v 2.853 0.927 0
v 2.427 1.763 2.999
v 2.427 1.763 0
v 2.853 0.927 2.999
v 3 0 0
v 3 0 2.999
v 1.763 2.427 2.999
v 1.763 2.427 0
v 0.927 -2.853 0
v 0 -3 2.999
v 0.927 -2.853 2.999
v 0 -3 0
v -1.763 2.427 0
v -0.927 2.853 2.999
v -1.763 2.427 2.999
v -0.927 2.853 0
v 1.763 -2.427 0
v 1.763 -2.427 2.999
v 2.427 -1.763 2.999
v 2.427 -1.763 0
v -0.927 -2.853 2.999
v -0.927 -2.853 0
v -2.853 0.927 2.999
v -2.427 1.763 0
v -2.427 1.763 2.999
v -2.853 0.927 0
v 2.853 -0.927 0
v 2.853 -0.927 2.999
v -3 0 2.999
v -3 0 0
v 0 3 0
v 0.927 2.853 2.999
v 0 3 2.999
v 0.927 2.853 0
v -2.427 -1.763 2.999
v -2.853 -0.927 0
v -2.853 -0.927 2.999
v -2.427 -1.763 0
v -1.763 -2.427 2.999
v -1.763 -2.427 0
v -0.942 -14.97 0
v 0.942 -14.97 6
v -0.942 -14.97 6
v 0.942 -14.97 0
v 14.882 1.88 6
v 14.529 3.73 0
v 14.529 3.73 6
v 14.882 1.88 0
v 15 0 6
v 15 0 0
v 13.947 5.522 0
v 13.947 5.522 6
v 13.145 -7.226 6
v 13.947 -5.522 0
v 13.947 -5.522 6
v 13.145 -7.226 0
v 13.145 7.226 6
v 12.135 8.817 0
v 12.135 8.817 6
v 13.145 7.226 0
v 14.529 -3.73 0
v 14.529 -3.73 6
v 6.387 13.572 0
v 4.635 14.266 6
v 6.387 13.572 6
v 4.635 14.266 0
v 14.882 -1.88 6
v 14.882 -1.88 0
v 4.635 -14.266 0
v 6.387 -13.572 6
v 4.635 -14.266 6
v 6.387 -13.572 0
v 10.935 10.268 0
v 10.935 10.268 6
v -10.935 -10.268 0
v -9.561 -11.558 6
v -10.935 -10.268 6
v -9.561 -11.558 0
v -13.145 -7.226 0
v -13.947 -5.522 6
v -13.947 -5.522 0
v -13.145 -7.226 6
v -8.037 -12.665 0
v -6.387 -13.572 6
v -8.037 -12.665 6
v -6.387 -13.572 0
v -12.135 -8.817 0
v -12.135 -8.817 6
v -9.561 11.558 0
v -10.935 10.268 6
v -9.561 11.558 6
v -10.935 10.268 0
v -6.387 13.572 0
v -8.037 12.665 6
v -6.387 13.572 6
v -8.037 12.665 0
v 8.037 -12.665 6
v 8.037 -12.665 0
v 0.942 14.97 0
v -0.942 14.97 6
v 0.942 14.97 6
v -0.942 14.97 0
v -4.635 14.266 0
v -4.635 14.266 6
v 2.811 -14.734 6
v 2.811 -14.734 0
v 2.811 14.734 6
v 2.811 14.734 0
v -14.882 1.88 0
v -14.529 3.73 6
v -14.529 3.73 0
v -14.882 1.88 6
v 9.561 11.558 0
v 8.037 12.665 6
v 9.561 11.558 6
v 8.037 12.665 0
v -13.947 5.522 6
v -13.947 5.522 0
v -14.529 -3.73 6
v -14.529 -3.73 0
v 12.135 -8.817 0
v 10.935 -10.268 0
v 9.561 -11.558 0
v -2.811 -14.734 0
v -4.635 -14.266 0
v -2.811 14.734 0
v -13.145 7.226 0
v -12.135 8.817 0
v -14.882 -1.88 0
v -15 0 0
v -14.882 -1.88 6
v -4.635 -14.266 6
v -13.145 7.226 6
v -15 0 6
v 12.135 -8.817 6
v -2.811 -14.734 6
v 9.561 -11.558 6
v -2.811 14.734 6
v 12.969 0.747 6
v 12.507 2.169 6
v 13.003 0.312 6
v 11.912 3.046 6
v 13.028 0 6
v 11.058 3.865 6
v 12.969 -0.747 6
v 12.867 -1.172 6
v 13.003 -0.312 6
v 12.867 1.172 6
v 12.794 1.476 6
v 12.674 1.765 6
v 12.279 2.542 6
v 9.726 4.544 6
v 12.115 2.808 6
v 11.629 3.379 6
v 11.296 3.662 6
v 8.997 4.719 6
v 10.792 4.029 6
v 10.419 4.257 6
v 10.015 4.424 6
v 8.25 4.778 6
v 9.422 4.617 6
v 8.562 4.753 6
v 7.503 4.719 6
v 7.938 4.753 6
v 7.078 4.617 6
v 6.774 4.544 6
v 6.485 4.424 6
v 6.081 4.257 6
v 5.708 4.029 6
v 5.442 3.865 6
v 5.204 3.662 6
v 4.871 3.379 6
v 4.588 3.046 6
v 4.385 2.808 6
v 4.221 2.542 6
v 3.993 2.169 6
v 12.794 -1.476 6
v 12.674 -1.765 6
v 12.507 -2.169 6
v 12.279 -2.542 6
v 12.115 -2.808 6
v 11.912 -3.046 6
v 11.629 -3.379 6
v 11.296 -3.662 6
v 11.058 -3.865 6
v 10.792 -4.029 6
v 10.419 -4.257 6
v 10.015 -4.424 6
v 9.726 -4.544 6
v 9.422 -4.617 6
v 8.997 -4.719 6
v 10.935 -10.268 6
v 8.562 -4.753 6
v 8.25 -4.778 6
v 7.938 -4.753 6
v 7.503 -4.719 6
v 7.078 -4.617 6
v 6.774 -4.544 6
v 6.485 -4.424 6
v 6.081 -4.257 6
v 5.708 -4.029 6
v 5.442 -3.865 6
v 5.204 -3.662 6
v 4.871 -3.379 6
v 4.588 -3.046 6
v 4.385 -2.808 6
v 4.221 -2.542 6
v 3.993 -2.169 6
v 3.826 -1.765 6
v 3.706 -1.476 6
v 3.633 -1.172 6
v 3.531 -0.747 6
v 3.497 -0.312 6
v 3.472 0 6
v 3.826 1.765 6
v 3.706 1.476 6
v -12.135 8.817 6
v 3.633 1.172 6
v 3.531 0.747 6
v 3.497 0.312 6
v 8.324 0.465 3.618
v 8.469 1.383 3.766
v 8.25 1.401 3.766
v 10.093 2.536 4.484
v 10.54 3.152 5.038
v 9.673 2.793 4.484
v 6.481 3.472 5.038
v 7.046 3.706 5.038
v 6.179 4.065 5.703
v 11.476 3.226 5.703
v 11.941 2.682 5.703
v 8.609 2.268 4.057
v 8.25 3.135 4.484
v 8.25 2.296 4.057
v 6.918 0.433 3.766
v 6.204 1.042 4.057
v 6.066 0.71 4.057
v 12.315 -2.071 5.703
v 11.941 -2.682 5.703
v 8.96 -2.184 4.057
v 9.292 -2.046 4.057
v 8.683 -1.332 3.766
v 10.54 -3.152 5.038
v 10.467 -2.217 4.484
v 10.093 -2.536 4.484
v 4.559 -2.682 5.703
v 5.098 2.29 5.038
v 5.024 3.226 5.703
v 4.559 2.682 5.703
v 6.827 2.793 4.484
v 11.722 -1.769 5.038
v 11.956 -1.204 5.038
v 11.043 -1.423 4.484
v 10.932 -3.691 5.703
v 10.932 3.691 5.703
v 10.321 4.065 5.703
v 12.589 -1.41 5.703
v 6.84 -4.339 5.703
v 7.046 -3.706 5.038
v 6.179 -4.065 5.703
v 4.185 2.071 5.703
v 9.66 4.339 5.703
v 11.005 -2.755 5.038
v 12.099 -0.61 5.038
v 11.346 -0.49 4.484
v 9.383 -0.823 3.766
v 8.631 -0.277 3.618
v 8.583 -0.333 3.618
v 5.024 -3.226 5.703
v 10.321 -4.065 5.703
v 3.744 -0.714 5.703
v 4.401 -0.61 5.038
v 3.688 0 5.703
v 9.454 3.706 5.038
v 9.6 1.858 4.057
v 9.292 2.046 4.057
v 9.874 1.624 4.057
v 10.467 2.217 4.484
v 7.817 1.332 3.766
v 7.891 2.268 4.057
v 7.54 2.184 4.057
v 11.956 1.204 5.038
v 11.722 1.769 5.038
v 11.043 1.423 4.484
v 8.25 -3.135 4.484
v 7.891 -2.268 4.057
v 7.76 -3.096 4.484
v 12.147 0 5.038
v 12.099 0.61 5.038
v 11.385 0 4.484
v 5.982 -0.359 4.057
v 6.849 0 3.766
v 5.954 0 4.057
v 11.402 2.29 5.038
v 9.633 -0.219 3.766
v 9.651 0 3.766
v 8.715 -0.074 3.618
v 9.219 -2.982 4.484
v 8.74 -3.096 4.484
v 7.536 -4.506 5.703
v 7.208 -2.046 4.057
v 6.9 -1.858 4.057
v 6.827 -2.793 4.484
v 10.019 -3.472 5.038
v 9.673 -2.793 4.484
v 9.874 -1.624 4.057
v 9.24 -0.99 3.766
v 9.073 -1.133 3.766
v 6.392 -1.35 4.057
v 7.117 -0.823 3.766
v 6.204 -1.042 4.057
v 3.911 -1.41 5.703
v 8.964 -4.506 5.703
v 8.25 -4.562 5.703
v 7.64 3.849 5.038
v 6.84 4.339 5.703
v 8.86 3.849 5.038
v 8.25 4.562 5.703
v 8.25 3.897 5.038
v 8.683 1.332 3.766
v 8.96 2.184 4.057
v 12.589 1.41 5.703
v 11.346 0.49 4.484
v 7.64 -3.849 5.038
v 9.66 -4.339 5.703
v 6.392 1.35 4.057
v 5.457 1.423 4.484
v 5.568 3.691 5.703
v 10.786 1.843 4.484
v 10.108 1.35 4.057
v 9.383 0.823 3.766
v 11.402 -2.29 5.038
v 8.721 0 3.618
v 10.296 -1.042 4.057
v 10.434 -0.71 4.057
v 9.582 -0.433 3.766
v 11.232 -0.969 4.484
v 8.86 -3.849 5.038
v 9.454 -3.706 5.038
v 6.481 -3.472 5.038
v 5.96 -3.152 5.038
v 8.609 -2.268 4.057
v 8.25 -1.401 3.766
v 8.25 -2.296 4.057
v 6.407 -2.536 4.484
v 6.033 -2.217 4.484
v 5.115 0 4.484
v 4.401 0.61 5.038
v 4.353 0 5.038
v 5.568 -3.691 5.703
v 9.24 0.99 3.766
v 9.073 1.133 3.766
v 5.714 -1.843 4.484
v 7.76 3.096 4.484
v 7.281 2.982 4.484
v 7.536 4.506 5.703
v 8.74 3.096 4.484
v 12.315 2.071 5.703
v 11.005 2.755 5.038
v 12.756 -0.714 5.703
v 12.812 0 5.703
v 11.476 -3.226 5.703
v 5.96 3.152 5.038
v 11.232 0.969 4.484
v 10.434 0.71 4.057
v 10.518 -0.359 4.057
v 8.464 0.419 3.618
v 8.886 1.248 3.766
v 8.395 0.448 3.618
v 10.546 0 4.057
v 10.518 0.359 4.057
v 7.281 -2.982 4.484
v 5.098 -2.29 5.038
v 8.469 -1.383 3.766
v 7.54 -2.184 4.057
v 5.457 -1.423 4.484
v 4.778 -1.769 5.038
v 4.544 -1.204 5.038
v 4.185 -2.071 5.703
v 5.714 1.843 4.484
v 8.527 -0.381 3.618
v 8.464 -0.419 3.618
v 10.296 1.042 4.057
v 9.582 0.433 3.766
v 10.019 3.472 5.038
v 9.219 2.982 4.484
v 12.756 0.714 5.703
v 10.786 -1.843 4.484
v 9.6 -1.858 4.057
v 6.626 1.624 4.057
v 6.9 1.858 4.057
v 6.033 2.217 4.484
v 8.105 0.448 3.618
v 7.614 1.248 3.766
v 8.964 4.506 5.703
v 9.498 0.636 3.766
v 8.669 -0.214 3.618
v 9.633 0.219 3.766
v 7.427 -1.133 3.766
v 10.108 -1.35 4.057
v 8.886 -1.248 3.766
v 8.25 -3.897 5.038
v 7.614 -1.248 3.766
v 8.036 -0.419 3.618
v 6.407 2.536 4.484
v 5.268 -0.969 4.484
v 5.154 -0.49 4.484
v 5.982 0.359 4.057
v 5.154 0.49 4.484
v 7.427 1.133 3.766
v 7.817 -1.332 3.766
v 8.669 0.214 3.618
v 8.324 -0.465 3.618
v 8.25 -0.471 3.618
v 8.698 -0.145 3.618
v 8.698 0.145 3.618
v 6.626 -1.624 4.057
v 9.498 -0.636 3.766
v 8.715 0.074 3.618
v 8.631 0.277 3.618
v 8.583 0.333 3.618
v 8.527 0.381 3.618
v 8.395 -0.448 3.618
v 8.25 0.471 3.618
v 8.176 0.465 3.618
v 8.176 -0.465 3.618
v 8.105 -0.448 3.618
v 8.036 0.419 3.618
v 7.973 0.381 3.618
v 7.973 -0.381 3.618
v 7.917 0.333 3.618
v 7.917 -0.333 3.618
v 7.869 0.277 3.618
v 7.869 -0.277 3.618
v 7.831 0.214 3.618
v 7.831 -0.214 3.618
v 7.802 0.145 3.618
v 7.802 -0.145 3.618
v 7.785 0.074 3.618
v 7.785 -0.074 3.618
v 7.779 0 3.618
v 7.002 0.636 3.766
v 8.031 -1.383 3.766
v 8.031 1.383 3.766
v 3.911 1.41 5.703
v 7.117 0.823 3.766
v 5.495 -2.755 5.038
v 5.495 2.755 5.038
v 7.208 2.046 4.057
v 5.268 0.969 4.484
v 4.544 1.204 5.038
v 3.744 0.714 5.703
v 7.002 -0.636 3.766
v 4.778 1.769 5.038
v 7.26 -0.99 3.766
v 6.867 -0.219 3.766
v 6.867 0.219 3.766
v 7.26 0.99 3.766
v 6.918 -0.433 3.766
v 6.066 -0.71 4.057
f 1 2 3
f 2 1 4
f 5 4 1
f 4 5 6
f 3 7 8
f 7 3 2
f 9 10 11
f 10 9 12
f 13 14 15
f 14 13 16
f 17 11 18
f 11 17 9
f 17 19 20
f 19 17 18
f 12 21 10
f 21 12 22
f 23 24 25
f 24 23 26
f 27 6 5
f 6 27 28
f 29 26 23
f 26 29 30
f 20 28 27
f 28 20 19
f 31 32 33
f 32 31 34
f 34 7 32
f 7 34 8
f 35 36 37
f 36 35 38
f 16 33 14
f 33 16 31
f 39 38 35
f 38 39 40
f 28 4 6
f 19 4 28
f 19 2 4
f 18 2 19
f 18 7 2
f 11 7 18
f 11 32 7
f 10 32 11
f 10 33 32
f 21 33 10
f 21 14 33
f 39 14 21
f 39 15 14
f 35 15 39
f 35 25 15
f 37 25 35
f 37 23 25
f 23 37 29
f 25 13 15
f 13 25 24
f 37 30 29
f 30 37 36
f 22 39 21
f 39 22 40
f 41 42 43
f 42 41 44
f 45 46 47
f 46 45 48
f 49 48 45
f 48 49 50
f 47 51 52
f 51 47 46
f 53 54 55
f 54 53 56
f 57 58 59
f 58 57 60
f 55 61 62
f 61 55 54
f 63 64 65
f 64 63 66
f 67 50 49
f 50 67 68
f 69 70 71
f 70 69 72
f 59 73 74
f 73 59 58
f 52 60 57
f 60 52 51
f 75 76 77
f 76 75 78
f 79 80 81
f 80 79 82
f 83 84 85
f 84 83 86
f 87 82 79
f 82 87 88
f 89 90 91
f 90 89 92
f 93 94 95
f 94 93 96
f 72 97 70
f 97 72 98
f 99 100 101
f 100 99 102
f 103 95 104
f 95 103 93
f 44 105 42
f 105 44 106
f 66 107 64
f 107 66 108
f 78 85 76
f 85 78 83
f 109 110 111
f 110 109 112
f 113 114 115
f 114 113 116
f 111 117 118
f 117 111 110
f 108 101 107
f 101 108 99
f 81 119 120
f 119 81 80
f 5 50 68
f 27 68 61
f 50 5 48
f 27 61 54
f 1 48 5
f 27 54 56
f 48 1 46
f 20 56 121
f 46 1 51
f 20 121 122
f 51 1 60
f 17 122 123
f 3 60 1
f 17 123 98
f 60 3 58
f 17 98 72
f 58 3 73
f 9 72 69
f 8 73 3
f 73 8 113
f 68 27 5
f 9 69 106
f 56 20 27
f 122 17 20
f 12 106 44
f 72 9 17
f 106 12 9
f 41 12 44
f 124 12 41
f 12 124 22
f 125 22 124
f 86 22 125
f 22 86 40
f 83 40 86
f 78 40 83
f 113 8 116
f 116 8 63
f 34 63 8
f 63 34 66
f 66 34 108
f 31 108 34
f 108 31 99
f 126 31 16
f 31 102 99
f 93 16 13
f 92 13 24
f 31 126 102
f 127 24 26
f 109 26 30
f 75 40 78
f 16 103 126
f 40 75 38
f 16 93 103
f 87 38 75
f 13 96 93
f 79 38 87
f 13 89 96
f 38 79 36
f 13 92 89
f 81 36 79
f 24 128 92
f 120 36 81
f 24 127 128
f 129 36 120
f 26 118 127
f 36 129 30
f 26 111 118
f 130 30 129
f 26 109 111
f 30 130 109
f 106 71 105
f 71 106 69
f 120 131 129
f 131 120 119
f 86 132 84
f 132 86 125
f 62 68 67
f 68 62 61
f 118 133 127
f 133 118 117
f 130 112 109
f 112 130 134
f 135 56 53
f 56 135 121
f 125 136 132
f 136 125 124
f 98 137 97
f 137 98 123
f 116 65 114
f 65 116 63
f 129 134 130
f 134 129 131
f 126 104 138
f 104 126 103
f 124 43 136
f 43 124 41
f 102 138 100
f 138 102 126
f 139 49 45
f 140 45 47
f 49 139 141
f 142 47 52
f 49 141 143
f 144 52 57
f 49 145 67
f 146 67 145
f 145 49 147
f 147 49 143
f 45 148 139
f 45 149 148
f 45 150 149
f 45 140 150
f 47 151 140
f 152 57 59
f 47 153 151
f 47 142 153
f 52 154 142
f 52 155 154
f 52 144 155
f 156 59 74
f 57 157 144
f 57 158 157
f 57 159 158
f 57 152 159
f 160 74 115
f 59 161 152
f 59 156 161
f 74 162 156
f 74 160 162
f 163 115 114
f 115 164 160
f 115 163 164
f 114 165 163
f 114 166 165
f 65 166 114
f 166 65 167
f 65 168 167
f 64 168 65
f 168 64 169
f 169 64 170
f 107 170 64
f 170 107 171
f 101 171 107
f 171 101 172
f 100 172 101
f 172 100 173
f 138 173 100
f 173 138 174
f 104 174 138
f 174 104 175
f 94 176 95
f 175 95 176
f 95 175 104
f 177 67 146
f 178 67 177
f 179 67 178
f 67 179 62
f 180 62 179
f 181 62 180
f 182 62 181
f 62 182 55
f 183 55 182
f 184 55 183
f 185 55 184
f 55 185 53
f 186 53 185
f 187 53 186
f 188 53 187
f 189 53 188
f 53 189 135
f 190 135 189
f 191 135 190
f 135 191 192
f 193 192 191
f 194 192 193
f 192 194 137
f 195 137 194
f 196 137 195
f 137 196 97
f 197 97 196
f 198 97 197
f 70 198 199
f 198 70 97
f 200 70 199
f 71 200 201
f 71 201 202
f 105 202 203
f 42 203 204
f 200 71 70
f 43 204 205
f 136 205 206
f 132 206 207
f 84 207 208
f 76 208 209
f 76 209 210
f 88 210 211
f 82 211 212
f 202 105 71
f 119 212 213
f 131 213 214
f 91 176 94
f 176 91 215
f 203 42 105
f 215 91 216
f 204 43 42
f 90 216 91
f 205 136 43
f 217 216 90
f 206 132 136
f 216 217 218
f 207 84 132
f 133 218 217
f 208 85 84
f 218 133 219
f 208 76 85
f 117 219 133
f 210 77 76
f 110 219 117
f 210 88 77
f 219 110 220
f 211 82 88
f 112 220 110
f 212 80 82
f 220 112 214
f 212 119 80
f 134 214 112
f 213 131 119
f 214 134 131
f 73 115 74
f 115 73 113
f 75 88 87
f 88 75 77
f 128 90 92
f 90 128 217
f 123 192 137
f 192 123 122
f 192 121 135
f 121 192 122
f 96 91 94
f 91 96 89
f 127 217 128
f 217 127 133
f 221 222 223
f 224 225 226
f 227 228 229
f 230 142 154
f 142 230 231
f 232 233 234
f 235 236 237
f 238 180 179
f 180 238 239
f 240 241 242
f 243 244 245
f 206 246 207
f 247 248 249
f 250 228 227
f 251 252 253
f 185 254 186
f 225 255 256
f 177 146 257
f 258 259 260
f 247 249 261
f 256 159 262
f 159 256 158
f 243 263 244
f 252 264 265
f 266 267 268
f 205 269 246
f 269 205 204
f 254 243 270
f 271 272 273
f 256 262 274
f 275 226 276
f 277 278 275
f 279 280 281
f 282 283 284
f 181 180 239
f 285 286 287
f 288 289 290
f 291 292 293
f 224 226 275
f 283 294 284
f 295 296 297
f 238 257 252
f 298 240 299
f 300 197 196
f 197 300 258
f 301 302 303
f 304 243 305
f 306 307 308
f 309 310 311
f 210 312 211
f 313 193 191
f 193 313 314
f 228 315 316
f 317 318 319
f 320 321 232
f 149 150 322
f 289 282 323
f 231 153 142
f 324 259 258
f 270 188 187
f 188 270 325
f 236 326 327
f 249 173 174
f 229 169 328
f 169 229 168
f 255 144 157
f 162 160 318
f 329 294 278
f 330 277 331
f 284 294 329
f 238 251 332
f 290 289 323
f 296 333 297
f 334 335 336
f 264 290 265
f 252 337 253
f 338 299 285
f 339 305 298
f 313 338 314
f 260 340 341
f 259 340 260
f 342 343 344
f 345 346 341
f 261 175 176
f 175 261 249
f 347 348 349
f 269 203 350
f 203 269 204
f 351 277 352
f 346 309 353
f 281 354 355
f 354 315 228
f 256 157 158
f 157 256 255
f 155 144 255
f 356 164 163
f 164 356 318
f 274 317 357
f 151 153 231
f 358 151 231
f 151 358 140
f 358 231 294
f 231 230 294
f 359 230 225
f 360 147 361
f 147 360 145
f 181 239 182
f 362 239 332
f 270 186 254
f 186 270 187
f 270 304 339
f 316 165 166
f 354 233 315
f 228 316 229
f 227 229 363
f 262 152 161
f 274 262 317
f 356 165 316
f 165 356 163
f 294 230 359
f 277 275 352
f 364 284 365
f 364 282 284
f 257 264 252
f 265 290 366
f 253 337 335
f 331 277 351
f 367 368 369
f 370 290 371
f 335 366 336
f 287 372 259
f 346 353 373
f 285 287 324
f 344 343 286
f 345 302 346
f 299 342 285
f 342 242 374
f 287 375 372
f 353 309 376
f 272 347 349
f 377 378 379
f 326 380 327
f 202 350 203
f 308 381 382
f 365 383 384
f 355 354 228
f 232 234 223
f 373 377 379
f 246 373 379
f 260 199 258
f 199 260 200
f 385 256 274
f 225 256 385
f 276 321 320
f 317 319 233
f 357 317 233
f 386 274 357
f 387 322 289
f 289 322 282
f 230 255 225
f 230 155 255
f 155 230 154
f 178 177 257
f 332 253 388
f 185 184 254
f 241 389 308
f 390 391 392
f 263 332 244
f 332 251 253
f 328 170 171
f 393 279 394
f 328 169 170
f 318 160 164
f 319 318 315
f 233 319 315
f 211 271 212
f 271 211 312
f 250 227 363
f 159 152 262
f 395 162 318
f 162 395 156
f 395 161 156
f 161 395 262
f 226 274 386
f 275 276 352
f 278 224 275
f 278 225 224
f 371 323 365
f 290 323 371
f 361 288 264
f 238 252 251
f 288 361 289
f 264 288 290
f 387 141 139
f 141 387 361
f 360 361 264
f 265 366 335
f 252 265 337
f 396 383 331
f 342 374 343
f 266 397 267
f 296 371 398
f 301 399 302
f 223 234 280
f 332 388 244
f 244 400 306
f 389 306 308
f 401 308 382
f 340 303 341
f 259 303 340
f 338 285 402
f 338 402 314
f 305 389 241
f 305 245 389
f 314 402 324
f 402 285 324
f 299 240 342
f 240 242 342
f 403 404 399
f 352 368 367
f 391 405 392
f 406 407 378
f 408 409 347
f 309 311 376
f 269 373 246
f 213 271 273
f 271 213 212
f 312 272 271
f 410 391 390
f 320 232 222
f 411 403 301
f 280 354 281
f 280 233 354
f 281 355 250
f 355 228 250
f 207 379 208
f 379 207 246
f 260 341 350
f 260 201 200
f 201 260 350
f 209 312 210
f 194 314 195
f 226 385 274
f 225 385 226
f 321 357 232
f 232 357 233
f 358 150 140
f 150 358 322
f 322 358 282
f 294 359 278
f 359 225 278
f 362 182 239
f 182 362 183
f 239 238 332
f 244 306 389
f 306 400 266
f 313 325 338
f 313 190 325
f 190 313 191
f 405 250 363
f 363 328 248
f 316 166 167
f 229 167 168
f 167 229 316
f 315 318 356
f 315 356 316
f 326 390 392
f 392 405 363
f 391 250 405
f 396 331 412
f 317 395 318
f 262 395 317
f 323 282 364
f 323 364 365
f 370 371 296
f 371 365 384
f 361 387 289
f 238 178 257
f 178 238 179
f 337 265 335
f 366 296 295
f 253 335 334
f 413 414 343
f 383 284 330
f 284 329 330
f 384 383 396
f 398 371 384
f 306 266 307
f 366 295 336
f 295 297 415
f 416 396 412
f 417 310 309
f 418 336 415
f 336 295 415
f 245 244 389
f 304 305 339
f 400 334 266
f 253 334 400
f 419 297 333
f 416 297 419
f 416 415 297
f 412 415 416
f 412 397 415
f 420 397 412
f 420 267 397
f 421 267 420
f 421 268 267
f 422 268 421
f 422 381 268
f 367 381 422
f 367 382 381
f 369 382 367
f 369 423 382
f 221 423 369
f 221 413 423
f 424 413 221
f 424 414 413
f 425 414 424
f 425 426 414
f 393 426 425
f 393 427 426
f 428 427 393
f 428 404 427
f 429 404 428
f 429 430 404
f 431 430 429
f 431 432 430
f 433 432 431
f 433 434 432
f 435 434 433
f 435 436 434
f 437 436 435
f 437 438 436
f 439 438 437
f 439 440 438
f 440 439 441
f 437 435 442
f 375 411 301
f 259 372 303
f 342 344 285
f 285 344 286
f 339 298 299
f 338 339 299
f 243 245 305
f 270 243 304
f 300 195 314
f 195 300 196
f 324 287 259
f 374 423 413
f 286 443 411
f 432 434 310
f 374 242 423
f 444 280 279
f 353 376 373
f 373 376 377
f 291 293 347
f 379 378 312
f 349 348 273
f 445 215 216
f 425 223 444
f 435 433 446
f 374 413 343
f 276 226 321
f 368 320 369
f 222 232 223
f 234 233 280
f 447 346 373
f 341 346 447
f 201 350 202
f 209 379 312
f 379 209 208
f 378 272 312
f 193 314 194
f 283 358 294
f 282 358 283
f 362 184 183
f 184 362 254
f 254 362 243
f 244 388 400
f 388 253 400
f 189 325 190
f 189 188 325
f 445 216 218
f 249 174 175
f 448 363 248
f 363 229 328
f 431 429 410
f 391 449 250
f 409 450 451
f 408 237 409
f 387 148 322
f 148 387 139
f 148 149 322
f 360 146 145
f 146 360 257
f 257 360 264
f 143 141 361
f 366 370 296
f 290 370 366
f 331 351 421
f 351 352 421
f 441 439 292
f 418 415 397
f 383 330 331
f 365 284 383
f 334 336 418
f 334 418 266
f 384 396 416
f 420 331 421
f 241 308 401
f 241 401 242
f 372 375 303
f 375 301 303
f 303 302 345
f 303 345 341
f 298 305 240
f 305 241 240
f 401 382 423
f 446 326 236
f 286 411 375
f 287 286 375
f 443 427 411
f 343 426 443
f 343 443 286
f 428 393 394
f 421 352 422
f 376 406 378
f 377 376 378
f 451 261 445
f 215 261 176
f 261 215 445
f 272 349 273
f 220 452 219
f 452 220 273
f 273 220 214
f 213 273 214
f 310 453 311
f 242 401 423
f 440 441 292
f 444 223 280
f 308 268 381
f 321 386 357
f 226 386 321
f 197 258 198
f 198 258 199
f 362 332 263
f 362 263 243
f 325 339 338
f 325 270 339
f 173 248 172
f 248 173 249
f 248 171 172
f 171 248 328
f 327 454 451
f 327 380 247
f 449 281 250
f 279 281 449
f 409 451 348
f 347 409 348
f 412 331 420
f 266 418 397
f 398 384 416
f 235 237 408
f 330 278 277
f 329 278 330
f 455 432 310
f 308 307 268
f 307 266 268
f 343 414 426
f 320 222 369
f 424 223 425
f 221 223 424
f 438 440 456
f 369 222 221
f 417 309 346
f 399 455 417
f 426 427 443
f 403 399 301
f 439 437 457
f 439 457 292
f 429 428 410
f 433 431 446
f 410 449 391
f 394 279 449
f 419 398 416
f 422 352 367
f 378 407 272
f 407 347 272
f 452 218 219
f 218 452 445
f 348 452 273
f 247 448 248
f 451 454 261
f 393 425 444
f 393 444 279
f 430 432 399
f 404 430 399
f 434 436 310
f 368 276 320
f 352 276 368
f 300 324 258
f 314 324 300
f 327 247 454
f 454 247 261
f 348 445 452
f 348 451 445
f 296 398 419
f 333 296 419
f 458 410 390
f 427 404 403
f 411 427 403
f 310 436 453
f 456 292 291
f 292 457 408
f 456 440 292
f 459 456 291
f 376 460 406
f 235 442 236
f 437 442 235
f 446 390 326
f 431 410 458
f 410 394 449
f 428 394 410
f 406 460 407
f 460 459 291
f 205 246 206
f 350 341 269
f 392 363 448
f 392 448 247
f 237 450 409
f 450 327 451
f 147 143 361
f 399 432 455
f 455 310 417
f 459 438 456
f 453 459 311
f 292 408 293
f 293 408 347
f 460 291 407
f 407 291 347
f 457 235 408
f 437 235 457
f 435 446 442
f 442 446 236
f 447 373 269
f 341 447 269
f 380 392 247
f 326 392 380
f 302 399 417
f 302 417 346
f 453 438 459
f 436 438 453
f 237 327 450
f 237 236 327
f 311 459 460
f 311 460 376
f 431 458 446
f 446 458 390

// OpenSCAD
//////////////////////////
// Customizable settings
//////////////////////////


// Diameter of the hole on the bottom (in mm).
HoleDiameter = 6;

// Depth of the hole in the bottom (in mm).  If you want the hole to go all the way through then set this to a number larger than the total height of the object.
HoleDepth = 3;

// If you want a D-shaped hole, set this to the thickness of the flat side (in mm).  Larger values for the flat make the hole smaller.
HoleFlatThickness = 0;

// Height (in mm).  If dome cap is selected, it is not included in height.  The shaft length is also not counted.
KnobHeight = 6;

// Diameter of base of round part of knob (in mm).  (Knurled ridges are not included in this measurement.)
KnobDiameter = 30;

// Shape of top of knob.  "Recessed" type can be painted.
CapType = 0;	// [0:Flat, 1:Recessed, 2:Dome]

// Do you want a large timer-knob style pointer?
TimerKnob=0;	// [0:No, 1:Yes]

// Would you like a divot on the top to indicate direction?
Pointer1 = 1;	// [0:No, 1:Yes]

// Would you like a line (pointer) on the front to indicate direction?
Pointer2 = 0;	// [0:No, 1:Yes]

// Do you want finger ridges around the knob?
Knurled = 0;	// [0:No, 1:Yes]

// 0 = A cylindrical knob, any other value will taper the knob.
TaperPercentage = 0;		// [0:0%, 10:10%, 20:20%, 30:30%, 40:40%, 50:50%]

// Width of "dial" ring (in mm).  Set to zero if you don't want the ring.
RingWidth = 0;

// The number of markings on the dial.  Set to zero if you don't want markings.  (RingWidth must be non-zero.)
RingMarkings = 10;

// diameter of the hole for the setscrew (in mm).  If you don't need a hole, set this to zero.
ScrewHoleDiameter = 0;

// Length of the shaft on the bottom of the knob (in mm).  If you don't want a shaft, set this value to zero.
ShaftLength = 0;

// Diameter of the shaft on the bottom of the knob (in mm).  (ShaftLength must be non-zero.)
ShaftDiameter = 10;

// Would you like a notch in the shaft?  It can be used for a press-on type knob (rather than using a setscrew).  (ShaftLength must be non-zero.)
NotchedShaft = 1;	// [0:No, 1:Yes]



//////////////////////////
//Advanced settings
//////////////////////////

RingThickness = 5*1;
DivotDepth = 1.5*1;
MarkingWidth = 1.5*1;
DistanceBetweenKnurls = 3*1;
TimerKnobConst = 1.8*1;



//////////////////////////
//Calculations
//////////////////////////

PI=3.14159265*1;
KnobMajorRadius = KnobDiameter/2;
KnobMinorRadius = KnobDiameter/2 * (1 - TaperPercentage/100);
KnobRadius = KnobMinorRadius + (KnobMajorRadius-KnobMinorRadius)/2;
KnobCircumference = PI*KnobDiameter;
Knurls = round(KnobCircumference/DistanceBetweenKnurls);
Divot=CapType;

TaperAngle=asin(KnobHeight / (sqrt(pow(KnobHeight, 2) +
		pow(KnobMajorRadius-KnobMinorRadius,2)))) - 90;

DivotRadius = KnobMinorRadius*.4;


union()
{
translate([0, 0, (ShaftLength==0)? 0 : ShaftLength-0.001])
difference()
{
union()
{
	// Primary knob cylinder
	cylinder(h=KnobHeight, r1=KnobMajorRadius, r2=KnobMinorRadius,
			$fn=50);
	
	if (Knurled)
		for (i=[0 : Knurls-1])
			rotate([0, 0, i * (360/Knurls)])
				translate([KnobRadius, 0, KnobHeight/2])
					rotate([0, TaperAngle, 0]) rotate([0, 0, 45])
						cube([2, 2, KnobHeight+.001], center=true);

 	if (RingMarkings>0)
		for (i=[0 : RingMarkings-1])
			rotate([0, 0, i * (360/RingMarkings)])
				translate([KnobMajorRadius + RingWidth/2, 0, 1])
					cube([RingWidth*.5, MarkingWidth, 2], center=true);		
	
	if (Pointer2==1)
		translate([KnobRadius, 0, KnobHeight/2-2])
			rotate([0, TaperAngle, 0])
				cube([8, 3, KnobHeight], center=true);		

	if (RingWidth>0)
		translate([0, 0, RingThickness/2])
			cylinder(r1=KnobMajorRadius + RingWidth, r2=KnobMinorRadius,
					h=RingThickness, $fn=50, center=true);

	if (Divot==2)
		translate([0, 0, KnobHeight])
			difference()
			{
				scale([1, 1, 0.5])
					sphere(r=KnobMinorRadius, $fn=50, center=true);

				translate([0, 0, 0-(KnobMinorRadius+.001)])
					cube([KnobMinorRadius*2.5, KnobMinorRadius*2.5,
							KnobMinorRadius*2], center=true);
			}

	if (TimerKnob==1) intersection()
		{
			translate([0, 0, 0-(KnobDiameter*TimerKnobConst) + KnobHeight])
			sphere(r=KnobDiameter*TimerKnobConst, $fn=50, center=true);		
	
			translate([0-(KnobDiameter*TimerKnobConst)*0.1, 0,
					KnobHeight/2])
				scale([1, 0.5, 1])
					cylinder(h=KnobHeight, r=(KnobDiameter*TimerKnobConst) *
							0.8, $fn=3, center=true);
		}
}

// Pointer1: Offset hemispherical divot
if (Pointer1==1)
	translate([KnobMinorRadius*.55, 0, KnobHeight + DivotRadius*.6])
		sphere(r=DivotRadius, $fn=40);

// Divot1: Centered cylynrical divot
if (Divot==1)
	translate([0, 0, KnobHeight])
		cylinder(h=DivotDepth*2, r=KnobMinorRadius-1.5, $fn=50,
				center=true);

if (ShaftLength==0)
{
	// Hole for shaft
	translate([0, 0, HoleDepth/2 - 0.001])
		difference()
		{
			cylinder(r=HoleDiameter/2, h=HoleDepth, $fn=20,
					center=true);
	
			// Flat for D-shaped hole
			translate([(0-HoleDiameter)+HoleFlatThickness, 0, 0])
				cube([HoleDiameter, HoleDiameter, HoleDepth+.001],
						center=true);
		}
	
	// Hole for setscrew
	if (ScrewHoleDiameter>0)
		translate([0 - (KnobMajorRadius+RingWidth+1)/2, 0,
				HoleDepth/2])
			rotate([0, 90, 0])
			cylinder(h=(KnobMajorRadius+RingWidth+1),
					r=ScrewHoleDiameter/2, $fn=20, center=true);
}

// Make sure bottom ends at z=0
translate([0, 0, -10])
	cube([(KnobMajorRadius+RingWidth) * 3,
			(KnobMajorRadius+RingWidth) * 3, 20], center=true);
}

if (ShaftLength>0)
	difference()
	{
		translate([0, 0, ShaftLength/2])
			cylinder(h=ShaftLength, r=ShaftDiameter/2, $fn=20,
					center=true);

		if (NotchedShaft==1)
		{
			cube([HoleDiameter/2, ShaftDiameter*2, ShaftLength],
					center=true);
		}

		// Hole for shaft
		translate([0, 0, HoleDepth/2 - 0.001])
			difference()
			{
				cylinder(r=HoleDiameter/2, h=HoleDepth, $fn=20,
						center=true);
		
				// Flat for D-shaped hole
				translate([(0-HoleDiameter)+HoleFlatThickness, 0, 0])
					cube([HoleDiameter, HoleDiameter, HoleDepth+.001],
							center=true);
			}
		
		// Hole for setscrew
		if (ScrewHoleDiameter>0)
			translate([0 - (KnobMajorRadius+RingWidth+1)/2, 0,
					HoleDepth/2])
				rotate([0, 90, 0])
				cylinder(h=(KnobMajorRadius+RingWidth+1),
						r=ScrewHoleDiameter/2, $fn=20, center=true);
	}
}
